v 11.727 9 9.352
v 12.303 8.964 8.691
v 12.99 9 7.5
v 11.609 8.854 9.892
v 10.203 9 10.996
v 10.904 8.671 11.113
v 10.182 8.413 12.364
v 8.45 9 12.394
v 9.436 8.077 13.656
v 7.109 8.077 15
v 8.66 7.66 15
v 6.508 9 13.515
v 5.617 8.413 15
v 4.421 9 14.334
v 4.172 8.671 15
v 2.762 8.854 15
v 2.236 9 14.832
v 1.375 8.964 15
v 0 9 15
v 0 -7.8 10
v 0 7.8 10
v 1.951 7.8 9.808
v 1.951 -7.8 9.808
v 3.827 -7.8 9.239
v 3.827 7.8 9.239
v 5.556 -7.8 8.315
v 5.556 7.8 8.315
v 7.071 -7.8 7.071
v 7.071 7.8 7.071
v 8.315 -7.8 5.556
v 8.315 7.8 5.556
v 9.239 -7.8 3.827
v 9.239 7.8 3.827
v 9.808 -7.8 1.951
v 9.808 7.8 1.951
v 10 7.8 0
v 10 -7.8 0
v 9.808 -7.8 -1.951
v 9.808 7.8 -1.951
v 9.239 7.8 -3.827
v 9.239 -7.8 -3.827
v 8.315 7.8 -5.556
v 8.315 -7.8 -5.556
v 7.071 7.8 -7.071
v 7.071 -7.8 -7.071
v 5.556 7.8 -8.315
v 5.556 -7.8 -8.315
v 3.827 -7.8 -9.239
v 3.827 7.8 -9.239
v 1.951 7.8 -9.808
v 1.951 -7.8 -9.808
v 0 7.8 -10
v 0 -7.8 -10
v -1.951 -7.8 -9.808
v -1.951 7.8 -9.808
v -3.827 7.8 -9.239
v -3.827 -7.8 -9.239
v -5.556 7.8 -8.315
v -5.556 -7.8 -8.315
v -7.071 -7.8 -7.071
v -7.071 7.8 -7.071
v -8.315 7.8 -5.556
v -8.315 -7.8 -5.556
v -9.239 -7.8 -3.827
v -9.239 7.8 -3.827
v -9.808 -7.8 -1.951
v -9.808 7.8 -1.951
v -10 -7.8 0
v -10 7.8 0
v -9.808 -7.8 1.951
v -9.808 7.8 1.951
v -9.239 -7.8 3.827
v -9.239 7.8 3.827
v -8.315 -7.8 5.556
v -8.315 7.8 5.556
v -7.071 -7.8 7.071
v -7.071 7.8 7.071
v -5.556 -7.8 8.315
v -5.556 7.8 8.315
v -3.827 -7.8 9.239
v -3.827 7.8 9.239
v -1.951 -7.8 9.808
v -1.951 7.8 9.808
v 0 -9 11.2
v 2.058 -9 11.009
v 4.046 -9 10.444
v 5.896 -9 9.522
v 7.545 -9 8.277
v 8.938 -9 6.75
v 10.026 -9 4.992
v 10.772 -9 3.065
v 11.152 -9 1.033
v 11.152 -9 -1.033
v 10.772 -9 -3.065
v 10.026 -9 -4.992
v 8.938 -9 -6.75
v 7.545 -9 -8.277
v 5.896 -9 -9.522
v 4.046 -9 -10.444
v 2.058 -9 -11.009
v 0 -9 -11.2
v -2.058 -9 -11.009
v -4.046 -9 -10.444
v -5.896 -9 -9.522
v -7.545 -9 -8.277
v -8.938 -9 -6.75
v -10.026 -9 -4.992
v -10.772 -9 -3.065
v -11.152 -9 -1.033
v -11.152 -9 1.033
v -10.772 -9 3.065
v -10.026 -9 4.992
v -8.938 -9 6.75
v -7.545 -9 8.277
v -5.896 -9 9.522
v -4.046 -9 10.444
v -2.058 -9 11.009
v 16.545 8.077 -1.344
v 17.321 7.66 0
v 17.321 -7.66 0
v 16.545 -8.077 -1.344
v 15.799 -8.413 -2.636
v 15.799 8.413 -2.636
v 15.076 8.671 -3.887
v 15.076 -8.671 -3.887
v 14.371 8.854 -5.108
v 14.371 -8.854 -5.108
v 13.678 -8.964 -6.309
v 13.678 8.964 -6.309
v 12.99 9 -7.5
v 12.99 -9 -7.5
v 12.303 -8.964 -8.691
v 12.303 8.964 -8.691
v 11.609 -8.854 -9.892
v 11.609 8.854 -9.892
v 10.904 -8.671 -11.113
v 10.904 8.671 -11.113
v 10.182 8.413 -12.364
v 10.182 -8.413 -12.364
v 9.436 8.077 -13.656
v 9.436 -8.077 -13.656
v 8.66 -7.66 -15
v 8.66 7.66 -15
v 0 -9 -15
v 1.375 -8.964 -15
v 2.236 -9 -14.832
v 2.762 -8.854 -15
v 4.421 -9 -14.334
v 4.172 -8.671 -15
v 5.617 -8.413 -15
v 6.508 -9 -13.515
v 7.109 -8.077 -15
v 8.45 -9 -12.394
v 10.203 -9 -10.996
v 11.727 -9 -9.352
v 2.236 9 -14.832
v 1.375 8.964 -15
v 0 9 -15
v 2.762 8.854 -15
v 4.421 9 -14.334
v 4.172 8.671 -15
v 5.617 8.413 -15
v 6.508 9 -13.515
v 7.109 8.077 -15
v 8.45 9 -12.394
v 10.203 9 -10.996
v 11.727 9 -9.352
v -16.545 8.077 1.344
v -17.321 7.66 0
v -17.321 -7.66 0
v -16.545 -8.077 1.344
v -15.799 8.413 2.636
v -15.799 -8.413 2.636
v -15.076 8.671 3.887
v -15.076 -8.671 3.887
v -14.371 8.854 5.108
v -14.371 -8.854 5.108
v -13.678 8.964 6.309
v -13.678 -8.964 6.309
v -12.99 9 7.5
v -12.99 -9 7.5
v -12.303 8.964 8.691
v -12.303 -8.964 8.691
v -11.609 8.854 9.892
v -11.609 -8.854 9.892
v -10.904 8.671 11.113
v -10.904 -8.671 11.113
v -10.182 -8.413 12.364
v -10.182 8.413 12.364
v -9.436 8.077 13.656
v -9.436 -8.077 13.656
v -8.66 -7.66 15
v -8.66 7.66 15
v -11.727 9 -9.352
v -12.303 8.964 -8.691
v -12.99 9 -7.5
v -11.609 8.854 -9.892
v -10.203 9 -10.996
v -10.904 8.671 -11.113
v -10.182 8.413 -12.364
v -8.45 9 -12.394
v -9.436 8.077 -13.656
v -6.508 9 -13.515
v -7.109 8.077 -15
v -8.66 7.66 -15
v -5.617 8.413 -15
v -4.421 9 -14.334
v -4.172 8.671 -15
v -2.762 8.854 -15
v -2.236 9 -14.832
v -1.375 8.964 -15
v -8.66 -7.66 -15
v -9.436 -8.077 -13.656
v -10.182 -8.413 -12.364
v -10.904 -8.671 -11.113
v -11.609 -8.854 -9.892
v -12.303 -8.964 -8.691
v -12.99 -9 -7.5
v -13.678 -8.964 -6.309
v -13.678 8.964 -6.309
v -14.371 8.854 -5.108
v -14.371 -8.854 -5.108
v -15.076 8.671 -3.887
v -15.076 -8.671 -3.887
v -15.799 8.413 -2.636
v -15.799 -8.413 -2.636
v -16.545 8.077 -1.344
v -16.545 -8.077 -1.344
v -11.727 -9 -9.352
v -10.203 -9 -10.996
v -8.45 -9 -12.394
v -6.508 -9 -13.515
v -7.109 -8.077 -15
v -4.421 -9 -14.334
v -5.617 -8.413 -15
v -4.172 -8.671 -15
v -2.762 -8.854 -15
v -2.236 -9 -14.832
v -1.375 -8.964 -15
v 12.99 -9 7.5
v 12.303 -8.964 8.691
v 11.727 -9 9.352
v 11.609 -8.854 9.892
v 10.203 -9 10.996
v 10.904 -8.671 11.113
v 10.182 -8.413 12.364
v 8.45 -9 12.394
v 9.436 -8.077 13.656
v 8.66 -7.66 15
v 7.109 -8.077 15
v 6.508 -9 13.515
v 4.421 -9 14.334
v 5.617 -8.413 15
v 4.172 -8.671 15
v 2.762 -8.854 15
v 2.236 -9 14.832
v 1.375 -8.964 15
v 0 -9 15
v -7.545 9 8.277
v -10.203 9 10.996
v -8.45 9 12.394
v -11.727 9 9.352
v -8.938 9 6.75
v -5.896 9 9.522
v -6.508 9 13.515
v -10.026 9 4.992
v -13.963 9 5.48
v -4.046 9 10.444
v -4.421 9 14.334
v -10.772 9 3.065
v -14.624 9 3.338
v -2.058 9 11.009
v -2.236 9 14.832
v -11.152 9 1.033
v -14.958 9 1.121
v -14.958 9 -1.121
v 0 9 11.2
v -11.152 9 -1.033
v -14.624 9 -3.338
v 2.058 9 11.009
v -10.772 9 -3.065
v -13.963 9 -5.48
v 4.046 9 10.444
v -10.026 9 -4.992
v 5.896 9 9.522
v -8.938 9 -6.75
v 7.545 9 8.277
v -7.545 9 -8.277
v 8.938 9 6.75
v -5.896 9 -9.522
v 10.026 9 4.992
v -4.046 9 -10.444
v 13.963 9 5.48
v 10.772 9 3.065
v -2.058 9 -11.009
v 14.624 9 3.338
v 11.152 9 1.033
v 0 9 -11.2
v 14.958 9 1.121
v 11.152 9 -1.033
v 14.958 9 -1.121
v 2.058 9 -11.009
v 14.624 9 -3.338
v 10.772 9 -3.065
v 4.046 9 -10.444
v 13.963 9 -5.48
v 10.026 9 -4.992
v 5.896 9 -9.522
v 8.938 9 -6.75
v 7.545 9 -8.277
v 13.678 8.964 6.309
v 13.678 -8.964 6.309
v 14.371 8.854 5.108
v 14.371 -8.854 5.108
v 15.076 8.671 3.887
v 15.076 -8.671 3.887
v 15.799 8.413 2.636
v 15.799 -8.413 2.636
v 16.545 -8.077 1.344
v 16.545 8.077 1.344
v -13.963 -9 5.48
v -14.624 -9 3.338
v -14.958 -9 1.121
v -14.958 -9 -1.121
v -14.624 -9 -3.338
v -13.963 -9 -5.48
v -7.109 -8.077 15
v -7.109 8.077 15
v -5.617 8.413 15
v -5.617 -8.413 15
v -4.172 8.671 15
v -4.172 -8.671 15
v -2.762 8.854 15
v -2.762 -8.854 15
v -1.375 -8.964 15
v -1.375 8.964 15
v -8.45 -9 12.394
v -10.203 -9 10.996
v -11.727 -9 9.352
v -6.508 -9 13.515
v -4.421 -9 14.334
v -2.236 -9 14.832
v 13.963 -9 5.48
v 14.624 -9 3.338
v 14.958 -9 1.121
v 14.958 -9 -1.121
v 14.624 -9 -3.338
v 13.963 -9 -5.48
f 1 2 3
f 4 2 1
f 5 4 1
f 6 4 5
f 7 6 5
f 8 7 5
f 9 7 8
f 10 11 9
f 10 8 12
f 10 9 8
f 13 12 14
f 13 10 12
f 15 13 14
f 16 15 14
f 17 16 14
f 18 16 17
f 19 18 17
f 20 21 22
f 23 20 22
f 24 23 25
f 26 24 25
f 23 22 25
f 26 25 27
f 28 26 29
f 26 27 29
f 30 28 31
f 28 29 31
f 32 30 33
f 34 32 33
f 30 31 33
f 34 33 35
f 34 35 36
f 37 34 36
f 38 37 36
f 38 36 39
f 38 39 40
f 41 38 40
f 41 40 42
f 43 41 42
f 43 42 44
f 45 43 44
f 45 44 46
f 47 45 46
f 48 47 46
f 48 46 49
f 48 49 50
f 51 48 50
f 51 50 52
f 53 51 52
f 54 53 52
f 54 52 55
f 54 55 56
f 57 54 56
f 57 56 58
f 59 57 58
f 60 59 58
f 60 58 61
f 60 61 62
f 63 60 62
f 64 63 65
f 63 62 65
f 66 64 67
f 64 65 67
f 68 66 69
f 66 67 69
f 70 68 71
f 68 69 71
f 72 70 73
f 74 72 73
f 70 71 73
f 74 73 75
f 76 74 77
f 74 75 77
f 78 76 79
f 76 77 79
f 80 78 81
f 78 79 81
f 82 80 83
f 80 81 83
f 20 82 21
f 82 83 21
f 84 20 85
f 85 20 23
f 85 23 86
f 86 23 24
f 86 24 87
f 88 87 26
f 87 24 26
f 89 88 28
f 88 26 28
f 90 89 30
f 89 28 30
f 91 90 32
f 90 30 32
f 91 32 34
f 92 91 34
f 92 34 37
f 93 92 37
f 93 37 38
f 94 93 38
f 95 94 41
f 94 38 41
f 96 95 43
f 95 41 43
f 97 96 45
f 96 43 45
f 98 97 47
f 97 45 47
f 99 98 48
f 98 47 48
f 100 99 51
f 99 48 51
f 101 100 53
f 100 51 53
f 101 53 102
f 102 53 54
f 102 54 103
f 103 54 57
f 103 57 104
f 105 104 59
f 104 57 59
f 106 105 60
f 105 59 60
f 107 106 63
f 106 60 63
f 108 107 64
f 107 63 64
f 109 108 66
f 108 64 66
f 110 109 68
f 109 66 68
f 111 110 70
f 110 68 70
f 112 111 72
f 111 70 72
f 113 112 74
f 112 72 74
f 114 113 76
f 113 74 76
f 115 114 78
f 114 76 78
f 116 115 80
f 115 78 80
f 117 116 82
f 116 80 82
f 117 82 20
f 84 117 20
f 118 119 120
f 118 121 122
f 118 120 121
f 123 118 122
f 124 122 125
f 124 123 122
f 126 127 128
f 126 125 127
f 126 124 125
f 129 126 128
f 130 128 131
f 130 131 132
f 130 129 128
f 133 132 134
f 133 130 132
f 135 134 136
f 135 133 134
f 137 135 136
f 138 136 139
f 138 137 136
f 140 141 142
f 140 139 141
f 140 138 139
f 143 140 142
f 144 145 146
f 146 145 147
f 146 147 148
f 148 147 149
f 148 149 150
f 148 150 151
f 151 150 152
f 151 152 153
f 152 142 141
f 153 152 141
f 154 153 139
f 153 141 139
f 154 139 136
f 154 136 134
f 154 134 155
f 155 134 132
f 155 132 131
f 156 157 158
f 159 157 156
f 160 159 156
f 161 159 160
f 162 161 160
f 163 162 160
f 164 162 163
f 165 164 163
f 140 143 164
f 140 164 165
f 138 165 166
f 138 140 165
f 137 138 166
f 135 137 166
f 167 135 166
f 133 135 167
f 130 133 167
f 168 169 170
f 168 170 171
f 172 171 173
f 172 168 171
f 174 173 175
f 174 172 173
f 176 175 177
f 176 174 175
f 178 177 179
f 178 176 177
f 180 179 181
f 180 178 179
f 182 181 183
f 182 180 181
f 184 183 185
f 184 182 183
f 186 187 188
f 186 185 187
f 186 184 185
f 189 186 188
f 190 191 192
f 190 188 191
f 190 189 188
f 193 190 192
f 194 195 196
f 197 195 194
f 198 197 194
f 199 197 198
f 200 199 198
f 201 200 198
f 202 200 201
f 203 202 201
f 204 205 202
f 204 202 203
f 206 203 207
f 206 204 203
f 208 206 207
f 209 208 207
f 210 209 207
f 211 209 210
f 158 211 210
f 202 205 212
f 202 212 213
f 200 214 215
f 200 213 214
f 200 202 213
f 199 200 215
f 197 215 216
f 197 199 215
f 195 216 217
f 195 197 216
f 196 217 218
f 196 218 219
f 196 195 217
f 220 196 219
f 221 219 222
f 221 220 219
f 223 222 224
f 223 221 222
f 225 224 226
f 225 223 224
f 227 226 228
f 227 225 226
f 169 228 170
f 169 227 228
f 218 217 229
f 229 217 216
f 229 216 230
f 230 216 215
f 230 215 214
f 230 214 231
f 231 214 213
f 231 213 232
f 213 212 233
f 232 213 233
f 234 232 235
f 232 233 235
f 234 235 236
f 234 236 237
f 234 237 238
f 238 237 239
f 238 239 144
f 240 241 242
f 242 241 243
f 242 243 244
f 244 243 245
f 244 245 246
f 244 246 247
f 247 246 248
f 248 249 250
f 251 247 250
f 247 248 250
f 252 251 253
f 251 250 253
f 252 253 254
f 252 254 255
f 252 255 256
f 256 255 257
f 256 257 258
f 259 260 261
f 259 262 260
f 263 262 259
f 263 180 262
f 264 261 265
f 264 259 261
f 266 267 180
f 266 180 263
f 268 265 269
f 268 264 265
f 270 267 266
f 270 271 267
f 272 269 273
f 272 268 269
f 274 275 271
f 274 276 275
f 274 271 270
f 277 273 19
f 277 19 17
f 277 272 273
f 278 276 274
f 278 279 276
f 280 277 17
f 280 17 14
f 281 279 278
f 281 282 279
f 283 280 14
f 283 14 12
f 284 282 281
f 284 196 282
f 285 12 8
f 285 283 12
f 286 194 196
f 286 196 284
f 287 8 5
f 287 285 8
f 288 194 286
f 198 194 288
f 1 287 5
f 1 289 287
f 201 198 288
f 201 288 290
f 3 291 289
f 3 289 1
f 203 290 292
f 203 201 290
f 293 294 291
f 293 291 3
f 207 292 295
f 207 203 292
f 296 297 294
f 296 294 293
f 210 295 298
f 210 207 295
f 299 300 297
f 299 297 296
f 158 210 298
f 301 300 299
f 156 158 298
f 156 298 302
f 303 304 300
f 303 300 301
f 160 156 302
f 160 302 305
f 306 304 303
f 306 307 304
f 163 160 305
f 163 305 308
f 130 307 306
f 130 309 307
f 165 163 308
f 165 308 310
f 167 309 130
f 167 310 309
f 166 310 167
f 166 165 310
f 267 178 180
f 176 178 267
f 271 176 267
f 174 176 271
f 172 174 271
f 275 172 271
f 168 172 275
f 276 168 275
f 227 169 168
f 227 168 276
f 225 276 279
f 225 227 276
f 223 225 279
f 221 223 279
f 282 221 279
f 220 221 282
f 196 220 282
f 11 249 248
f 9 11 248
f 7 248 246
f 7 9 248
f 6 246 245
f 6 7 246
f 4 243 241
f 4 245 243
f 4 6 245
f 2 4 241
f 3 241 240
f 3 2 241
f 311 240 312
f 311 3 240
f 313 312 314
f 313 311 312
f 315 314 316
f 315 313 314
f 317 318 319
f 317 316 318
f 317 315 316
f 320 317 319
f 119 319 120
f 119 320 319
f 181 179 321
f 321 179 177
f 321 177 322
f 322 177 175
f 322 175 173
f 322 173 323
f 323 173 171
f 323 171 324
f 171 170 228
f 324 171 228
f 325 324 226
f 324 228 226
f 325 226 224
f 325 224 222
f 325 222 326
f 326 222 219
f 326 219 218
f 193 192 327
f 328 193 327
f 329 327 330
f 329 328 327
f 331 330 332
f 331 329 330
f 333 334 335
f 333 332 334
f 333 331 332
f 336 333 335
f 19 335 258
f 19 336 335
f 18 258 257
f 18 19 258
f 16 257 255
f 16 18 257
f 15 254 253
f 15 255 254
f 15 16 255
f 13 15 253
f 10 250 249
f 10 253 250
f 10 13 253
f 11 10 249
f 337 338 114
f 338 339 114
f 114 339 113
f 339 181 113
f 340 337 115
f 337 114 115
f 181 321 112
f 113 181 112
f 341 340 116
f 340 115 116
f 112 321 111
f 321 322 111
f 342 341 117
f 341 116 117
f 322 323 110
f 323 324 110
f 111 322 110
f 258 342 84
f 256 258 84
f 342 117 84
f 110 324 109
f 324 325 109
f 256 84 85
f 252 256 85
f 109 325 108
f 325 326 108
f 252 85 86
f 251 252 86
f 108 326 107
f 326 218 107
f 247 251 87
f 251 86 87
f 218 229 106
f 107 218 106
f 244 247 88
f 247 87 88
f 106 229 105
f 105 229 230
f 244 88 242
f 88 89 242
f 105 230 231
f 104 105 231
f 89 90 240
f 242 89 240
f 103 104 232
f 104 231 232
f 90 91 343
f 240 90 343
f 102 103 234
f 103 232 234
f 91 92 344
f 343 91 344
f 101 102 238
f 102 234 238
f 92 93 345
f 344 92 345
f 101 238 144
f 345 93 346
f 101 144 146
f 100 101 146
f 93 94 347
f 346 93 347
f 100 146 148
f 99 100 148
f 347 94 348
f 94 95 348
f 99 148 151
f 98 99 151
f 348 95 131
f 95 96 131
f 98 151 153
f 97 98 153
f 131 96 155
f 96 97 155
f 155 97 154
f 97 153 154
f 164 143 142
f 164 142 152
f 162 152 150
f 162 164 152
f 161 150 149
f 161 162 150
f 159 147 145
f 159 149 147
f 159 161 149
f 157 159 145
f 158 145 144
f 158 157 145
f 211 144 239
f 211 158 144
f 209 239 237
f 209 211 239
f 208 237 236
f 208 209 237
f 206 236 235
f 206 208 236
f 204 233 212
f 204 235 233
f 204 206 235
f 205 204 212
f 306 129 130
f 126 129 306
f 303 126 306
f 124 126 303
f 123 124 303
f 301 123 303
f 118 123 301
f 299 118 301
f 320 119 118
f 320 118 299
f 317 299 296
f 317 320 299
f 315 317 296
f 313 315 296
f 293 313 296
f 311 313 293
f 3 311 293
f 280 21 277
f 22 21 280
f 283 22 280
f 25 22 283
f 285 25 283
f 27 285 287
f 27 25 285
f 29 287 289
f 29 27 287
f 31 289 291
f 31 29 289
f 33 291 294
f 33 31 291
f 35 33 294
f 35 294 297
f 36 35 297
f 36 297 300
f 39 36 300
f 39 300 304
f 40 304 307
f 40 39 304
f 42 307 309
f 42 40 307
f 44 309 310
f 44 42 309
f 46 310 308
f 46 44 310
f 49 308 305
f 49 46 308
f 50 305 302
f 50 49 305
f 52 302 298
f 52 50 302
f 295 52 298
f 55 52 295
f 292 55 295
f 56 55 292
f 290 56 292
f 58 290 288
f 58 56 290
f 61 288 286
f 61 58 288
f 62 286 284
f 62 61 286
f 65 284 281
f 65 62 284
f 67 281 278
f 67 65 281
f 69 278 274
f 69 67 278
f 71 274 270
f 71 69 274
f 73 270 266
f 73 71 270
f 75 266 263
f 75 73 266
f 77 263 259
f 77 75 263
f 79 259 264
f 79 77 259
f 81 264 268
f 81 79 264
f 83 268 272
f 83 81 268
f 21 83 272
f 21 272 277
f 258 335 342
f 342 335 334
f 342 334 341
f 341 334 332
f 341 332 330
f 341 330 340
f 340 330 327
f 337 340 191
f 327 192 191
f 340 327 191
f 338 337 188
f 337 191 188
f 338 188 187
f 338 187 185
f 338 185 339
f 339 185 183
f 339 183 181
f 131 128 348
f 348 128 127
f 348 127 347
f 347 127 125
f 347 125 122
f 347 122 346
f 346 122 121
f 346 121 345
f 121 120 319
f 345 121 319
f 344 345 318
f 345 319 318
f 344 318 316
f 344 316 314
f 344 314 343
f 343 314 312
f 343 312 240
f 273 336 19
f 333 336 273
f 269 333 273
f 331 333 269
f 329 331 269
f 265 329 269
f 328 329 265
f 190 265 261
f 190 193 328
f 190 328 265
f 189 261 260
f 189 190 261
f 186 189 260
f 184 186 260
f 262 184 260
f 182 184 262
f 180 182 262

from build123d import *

# Parameters (mm, degrees)
EXTRUDE_1_DEPTH     = 9
SKETCH_2_R          = 10
CUT_EXTRUDE_1_DEPTH = 30.137604569
CHAMFER_1_SIZE      = 1.2


with BuildPart() as part:
    # 草图1 → 凸台-拉伸1 (new, symmetric)
    with BuildSketch(Plane(origin=(0, 0, 0), x_dir=(1, 0, 0), z_dir=(0, 1, 0))):
        Polygon((17.320508076, 0), (8.660254038, 15), (-8.660254038, 15), (-17.320508076, 0), (-8.660254038, -15), (8.660254038, -15), align=None)
    extrude(amount=EXTRUDE_1_DEPTH, both=True)

    # 草图2 → 切除-拉伸1 (cut, through all)
    with BuildSketch(Plane(origin=(0, 9, 0), x_dir=(1, 0, 0), z_dir=(0, 1, 0))):
        with Locations(Location((0, 0, 0), (0, 0, 270))):
            Circle(SKETCH_2_R)
    extrude(amount=-CUT_EXTRUDE_1_DEPTH, mode=Mode.SUBTRACT)

    # 倒角1
    chamfer_1_edges = [part.edges().sort_by_distance(p)[0] for p in [
        (0, -9, -10),
        (0, 9, -10),
    ]]
    chamfer(chamfer_1_edges, length=CHAMFER_1_SIZE)

    # 草图3 → 切除-旋转1 (revolve, cut)
    with BuildSketch(Plane.XY, mode=Mode.PRIVATE) as cut_revolve_1_sk:
        Polygon((17.320508076, 9), (15, 9), (17.320508076, 7.660254038), align=None)
    cut_revolve_1 = revolve(cut_revolve_1_sk.sketch.rotate(Axis((0, 9, 0), (0, -1, 0)), 270), axis=Axis((0, 9, 0), (0, -1, 0)), mode=Mode.SUBTRACT)

    # 镜向1: 切除-旋转1 across plane
    add(cut_revolve_1.mirror(Plane.ZX), mode=Mode.SUBTRACT)


solid = part.part
